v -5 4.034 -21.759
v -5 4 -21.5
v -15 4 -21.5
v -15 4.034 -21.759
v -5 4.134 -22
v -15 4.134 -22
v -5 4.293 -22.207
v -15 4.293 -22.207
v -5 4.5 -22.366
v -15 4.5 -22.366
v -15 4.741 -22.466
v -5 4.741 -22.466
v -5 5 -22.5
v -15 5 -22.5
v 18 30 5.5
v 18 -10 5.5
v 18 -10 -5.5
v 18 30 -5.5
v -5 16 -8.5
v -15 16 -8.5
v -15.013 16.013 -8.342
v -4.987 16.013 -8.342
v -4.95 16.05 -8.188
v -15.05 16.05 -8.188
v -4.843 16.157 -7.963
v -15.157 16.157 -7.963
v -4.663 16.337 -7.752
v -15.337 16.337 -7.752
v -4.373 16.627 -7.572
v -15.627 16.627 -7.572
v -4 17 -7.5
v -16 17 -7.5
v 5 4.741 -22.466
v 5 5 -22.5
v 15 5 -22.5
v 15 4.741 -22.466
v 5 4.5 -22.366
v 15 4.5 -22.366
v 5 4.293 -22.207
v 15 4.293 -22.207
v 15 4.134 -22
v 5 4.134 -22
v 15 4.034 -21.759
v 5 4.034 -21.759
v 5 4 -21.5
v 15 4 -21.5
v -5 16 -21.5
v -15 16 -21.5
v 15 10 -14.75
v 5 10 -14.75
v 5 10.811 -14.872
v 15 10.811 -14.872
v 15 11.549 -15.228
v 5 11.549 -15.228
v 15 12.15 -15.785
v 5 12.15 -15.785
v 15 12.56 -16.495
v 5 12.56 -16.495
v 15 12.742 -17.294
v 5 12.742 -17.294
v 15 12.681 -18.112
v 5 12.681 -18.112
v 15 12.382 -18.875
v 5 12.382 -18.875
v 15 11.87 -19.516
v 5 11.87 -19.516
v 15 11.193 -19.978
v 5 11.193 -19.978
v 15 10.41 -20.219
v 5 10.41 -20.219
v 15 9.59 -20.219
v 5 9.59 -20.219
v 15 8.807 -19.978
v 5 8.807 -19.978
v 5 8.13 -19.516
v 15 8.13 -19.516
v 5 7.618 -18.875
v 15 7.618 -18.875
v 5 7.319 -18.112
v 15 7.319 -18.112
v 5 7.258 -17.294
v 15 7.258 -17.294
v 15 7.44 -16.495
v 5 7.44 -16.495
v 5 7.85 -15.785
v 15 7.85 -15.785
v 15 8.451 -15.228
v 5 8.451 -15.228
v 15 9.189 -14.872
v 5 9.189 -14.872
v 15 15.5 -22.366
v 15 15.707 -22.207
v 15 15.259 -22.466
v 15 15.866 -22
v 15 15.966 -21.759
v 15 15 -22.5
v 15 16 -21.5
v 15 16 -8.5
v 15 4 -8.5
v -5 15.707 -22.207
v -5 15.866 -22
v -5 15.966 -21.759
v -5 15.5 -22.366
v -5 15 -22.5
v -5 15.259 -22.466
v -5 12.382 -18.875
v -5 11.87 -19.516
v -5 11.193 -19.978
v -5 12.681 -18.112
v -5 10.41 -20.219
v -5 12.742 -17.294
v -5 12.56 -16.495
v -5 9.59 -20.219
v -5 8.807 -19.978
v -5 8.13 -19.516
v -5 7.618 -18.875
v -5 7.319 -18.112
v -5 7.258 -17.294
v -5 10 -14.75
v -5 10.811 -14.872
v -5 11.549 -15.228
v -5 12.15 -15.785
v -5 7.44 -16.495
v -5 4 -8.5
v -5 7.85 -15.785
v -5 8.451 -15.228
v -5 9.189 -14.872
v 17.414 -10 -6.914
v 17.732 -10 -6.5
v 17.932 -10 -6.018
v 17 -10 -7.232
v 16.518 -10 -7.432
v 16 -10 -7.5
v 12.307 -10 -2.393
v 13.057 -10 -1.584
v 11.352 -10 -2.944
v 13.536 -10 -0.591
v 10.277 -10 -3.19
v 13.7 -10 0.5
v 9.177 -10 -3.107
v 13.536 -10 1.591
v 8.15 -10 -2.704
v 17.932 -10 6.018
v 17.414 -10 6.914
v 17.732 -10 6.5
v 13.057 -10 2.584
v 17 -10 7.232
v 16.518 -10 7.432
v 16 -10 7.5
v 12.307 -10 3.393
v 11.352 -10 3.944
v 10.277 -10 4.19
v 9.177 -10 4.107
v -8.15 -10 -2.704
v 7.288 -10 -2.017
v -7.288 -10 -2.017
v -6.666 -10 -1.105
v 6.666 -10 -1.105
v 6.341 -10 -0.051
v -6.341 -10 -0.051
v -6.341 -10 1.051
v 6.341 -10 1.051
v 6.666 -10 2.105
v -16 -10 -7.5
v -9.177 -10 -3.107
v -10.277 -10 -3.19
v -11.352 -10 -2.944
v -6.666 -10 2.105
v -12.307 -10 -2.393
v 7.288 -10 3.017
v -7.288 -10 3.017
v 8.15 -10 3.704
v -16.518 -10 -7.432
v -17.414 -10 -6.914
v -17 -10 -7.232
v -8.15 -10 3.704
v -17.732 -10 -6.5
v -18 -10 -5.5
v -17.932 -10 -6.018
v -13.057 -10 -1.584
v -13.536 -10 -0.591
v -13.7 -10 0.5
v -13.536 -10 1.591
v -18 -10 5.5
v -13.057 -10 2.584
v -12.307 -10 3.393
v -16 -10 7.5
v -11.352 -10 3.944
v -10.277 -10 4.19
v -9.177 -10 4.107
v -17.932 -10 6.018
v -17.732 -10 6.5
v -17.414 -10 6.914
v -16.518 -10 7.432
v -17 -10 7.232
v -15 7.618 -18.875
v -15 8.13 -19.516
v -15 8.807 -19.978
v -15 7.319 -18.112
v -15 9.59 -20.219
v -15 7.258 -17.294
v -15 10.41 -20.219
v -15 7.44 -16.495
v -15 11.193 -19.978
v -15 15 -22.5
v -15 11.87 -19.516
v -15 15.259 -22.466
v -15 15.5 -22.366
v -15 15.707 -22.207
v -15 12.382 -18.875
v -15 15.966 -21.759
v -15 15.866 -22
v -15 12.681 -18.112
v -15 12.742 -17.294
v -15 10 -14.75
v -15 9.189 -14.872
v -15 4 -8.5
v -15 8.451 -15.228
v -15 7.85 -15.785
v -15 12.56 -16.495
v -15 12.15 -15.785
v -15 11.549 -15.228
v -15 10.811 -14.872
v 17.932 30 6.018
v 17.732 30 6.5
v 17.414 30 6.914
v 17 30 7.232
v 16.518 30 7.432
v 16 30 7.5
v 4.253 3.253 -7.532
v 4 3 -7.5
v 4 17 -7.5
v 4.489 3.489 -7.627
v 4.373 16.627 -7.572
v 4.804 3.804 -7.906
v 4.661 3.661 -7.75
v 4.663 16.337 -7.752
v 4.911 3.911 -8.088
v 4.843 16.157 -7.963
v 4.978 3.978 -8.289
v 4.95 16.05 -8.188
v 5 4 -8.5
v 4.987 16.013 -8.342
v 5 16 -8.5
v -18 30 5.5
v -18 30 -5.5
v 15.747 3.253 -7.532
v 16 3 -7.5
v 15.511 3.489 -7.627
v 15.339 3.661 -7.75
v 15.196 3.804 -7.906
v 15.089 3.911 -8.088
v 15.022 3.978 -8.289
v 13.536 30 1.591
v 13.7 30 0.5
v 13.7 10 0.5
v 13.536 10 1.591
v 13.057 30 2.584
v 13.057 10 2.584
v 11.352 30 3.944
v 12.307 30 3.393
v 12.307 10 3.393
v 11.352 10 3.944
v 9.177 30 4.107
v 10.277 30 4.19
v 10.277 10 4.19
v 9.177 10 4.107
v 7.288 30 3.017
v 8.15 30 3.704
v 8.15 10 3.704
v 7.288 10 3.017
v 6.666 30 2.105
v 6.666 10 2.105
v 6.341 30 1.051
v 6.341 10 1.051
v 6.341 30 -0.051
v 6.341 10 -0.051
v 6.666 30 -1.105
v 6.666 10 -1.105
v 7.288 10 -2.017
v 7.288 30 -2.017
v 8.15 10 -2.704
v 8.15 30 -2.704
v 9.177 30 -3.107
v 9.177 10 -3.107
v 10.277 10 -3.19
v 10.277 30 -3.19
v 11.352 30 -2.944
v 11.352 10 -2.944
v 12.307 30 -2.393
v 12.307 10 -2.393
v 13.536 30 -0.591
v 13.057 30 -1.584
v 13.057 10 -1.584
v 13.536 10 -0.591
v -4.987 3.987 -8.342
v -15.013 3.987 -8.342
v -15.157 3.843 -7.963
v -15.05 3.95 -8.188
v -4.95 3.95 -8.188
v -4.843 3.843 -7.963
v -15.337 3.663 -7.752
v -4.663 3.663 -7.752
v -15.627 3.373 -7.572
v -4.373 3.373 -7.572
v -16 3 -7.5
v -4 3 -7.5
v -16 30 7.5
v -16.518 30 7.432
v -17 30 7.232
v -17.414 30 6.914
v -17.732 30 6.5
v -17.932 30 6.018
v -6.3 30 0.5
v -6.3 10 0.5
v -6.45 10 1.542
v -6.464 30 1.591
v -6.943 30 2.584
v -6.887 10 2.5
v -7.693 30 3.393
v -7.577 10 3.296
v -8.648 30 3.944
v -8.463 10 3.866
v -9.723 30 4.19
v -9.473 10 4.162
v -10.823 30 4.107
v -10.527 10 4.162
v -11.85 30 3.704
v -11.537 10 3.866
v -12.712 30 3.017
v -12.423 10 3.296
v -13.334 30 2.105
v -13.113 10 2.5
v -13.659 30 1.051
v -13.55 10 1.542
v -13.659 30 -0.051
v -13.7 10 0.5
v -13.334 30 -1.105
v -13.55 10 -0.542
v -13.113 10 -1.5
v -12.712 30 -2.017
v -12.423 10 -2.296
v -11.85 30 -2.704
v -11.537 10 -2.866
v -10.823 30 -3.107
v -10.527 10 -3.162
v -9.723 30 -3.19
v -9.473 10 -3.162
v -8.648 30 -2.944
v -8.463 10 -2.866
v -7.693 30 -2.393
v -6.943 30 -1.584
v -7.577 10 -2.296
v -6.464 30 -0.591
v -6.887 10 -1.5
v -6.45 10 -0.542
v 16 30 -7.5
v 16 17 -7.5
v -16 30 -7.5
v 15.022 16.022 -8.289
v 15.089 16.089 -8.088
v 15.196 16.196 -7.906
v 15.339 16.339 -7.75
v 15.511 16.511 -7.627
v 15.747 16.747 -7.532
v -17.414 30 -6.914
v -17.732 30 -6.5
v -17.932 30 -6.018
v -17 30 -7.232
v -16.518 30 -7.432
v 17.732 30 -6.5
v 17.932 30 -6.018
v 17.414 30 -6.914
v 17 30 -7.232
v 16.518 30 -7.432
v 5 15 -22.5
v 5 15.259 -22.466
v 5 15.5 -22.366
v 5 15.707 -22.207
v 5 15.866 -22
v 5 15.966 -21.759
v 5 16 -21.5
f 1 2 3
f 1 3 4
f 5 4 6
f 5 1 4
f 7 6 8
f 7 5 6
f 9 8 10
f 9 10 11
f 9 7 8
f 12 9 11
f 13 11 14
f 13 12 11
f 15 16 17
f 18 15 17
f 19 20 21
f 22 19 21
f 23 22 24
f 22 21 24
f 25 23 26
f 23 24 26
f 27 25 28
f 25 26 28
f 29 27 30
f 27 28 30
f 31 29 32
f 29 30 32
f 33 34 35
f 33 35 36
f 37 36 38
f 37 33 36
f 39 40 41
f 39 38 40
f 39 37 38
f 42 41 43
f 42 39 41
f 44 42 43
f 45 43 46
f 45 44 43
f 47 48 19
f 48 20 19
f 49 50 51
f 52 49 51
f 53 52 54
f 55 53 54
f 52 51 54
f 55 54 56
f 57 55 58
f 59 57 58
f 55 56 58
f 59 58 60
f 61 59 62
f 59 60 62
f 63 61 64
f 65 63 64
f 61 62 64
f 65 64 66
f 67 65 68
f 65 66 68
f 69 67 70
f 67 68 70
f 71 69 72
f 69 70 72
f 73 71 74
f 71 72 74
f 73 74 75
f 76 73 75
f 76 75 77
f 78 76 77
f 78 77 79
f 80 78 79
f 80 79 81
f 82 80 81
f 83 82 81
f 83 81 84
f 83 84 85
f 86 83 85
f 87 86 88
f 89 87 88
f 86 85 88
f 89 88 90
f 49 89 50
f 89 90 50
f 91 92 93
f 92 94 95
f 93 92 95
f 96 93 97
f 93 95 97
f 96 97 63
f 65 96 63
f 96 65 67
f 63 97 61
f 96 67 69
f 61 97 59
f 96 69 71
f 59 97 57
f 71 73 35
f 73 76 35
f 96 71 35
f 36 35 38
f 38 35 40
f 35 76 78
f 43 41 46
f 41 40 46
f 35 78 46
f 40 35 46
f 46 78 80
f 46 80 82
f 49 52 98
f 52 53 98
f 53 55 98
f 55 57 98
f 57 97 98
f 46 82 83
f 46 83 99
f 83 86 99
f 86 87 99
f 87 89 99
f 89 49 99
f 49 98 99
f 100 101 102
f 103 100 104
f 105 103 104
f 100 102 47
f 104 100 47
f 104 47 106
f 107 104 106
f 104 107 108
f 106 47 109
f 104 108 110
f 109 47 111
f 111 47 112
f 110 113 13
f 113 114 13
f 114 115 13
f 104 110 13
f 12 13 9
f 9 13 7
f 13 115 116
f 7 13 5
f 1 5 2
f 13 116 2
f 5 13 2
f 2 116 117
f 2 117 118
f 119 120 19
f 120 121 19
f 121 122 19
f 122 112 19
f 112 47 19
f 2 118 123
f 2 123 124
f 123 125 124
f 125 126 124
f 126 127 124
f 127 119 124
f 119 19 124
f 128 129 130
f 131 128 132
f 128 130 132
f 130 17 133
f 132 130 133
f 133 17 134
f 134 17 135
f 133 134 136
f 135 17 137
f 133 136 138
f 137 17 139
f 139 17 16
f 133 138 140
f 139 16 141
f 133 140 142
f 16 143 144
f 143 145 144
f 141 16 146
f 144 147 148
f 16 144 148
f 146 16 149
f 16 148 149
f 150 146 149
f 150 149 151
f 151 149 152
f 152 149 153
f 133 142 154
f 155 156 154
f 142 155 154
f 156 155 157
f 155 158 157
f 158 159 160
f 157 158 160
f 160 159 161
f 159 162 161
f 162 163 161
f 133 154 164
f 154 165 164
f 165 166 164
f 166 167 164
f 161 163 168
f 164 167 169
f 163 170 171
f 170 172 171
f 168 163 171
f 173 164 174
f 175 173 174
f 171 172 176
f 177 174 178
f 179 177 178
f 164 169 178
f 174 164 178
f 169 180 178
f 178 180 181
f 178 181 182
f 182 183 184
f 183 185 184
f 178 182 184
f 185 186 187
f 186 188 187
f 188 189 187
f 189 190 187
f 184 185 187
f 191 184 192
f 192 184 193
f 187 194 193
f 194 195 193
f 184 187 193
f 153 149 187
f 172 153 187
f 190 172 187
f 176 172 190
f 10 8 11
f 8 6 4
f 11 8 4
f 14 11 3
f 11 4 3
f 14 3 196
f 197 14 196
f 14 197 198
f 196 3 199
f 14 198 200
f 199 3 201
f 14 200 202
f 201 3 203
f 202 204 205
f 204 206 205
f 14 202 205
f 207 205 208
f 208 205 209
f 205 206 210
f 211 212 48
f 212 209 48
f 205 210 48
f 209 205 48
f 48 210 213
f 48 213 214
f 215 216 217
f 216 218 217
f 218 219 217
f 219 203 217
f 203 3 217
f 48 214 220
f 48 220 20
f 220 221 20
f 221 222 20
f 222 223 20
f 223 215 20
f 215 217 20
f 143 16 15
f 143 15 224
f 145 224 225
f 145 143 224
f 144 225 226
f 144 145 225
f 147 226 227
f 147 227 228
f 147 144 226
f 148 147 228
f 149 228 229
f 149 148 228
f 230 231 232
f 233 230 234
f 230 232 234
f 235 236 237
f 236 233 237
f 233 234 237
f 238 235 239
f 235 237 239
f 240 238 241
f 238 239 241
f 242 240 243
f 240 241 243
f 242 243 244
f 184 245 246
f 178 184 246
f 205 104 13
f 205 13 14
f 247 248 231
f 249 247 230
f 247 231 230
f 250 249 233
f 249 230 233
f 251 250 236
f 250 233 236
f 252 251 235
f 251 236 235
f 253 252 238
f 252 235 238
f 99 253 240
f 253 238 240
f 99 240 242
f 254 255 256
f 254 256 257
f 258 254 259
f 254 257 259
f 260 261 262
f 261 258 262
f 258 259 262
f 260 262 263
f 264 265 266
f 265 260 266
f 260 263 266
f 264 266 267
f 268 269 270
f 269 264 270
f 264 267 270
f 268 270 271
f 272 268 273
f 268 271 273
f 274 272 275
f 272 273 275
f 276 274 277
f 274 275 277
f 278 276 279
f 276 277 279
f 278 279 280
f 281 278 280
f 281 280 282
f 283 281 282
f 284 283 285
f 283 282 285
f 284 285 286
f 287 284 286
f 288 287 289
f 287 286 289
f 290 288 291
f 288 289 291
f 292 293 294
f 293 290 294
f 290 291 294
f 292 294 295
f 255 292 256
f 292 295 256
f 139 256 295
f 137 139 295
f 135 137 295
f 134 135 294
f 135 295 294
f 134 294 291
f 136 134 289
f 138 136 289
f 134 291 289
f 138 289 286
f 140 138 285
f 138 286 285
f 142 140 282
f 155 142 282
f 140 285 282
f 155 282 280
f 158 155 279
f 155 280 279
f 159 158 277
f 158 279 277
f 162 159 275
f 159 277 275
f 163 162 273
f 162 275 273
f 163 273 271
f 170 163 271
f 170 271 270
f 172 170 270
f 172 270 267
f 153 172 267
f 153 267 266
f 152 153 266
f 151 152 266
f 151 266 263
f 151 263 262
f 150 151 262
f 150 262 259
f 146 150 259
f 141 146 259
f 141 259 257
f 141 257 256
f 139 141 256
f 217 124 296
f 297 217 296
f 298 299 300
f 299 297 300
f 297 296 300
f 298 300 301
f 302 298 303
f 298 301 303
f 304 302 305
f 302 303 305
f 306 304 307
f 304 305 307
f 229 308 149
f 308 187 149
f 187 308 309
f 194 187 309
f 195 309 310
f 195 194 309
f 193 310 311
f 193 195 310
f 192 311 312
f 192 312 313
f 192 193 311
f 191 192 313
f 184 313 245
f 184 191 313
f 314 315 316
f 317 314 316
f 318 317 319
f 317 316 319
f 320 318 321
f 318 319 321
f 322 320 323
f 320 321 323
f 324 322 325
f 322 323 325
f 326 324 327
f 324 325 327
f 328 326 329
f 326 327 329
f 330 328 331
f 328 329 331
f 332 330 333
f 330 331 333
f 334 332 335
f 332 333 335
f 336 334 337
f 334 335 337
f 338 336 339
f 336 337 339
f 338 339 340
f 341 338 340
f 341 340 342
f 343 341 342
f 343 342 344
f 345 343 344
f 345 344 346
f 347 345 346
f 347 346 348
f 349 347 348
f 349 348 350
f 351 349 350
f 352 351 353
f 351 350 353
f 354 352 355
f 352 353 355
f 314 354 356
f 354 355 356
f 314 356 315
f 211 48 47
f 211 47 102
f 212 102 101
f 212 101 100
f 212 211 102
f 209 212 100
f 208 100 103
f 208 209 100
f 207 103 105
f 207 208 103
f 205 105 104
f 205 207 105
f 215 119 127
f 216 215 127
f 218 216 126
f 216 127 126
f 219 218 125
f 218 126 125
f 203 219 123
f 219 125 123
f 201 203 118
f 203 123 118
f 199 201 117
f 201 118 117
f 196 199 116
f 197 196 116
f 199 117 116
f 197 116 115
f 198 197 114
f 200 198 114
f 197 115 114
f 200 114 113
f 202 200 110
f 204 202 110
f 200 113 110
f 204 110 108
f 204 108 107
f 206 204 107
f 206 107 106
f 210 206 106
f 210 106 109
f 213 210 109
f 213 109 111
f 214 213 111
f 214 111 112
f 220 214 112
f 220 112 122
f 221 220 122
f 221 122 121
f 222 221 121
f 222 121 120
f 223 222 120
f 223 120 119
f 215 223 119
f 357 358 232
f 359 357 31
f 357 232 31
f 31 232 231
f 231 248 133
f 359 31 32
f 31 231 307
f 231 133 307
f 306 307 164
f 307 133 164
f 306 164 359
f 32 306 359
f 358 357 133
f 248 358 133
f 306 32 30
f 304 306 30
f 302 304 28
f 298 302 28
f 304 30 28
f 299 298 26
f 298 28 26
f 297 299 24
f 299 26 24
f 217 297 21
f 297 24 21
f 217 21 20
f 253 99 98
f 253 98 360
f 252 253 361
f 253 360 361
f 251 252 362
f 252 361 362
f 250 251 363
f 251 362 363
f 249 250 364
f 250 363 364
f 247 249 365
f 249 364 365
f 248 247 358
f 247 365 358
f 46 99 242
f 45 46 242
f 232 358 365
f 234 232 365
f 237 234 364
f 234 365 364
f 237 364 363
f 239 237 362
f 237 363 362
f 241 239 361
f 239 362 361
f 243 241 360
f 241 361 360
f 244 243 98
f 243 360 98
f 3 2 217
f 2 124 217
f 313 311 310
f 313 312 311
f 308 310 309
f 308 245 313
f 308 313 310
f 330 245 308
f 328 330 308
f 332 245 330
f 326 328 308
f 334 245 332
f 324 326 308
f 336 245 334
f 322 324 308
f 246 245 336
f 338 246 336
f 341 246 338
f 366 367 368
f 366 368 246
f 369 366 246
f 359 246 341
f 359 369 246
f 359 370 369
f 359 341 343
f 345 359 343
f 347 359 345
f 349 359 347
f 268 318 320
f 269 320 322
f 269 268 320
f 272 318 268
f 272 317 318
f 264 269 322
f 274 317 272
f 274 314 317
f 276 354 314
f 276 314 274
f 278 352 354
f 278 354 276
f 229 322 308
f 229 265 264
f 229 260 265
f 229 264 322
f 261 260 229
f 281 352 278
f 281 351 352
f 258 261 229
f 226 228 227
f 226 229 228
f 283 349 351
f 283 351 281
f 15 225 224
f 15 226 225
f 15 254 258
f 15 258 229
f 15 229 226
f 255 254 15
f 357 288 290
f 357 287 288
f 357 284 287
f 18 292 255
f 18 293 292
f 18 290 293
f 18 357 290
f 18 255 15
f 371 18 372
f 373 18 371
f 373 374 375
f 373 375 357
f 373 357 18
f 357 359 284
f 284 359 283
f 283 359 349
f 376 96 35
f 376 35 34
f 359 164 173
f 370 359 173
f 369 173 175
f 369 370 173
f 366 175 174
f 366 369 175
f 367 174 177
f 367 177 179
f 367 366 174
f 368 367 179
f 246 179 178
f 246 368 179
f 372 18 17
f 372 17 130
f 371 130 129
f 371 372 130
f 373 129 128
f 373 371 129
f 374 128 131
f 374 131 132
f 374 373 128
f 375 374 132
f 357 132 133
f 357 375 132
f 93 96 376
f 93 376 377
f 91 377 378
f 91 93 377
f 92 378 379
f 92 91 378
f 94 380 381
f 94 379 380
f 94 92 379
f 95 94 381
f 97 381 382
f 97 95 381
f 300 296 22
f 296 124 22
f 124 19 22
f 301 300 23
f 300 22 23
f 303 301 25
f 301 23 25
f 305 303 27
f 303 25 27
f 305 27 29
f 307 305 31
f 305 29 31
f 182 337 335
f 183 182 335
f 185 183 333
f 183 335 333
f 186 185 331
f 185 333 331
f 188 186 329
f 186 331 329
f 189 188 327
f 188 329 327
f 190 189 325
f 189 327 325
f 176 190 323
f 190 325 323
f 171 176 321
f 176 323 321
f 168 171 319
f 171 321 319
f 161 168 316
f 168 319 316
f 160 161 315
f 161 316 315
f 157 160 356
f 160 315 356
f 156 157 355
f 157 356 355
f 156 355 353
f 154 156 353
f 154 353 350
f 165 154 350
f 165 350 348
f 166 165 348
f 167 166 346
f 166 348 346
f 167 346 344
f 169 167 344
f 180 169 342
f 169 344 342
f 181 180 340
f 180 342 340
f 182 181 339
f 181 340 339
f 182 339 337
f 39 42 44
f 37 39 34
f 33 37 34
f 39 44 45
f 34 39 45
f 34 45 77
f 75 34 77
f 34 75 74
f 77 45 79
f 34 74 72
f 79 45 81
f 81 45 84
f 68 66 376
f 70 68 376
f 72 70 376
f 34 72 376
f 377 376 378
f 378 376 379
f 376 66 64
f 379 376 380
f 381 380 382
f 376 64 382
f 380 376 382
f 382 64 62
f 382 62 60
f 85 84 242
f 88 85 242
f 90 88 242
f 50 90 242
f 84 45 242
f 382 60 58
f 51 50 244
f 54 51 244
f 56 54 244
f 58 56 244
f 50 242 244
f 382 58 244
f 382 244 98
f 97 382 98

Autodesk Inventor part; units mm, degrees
ref_plane "YZ Plane" through (0, 0, 0) normal (1, 0, 0) x (0, 1, 0)
ref_plane "XZ Plane" through (0, 0, 0) normal (0, 1, 0) x (-1, 0, 0)
ref_plane "XY Plane" through (0, 0, 0) normal (0, 0, 1) x (1, 0, 0)
sketch "Szkic2" plane through (0, 0, 0) normal (0, 1, 0) x (-1, 0, 0)
  line L0 (-20, -7.5) -> (20, -7.5)
  line L1 (20, -7.5) -> (20, 7.5)
  line L2 (20, 7.5) -> (-20, 7.5)
  line L3 (-20, 7.5) -> (-20, -7.5)
  line L4 (-20, -7.5) -> (20, 7.5) construction
  line L5 (20, -7.5) -> (-20, 7.5) construction
  point P0 (0, 0)
  dimension "d12" = 40
  dimension "d13" = 15
extrude "Wyciągnięcie proste1" add sketch "Szkic2" along normal mid plane 20
sketch "Szkic3" plane through (0, 10, 0) normal (0, 1, 0) x (1, 0, 0)
  line L0 (18, 7.5) -> (-18, 7.5)
  line L1 (-18, 7.5) -> (-18, -7.5)
  line L2 (-18, -7.5) -> (18, -7.5)
  line L3 (18, -7.5) -> (18, 7.5)
  line L4 (18, 7.5) -> (-18, -7.5) construction
  line L5 (-18, 7.5) -> (18, -7.5) construction
  circle A0 centre (10, -0.5) radius 6
  circle A1 centre (-10, -0.5) radius 6
  circle A2 centre (10, -0.5) radius 3.7
  circle A3 centre (-10, -0.5) radius 3.7
  line L6 (-20, -7.5) -> (20, -7.5) projected
  point P0 (0, 0)
  point P1 (10, -7)
  point P2 (10, 8)
  point P3 (-13.3166, 8)
  point P4 (-10, -7)
  point P5 (15.1962, -4)
  point P6 (-15.1962, -4)
  dimension "d16" = 36
  dimension "d17" = 15
  dimension "d18" = 12
  dimension "d19" = 8
  dimension "d20" = 8
  dimension "d21" = 12
  dimension "d22" = 8
  dimension "d23" = 8
  dimension "d24" = 7.4
  dimension "d25" = 7.4
fillet "Zaokrąglenie1" radius 2 4 edges at (20, 0, 7.5) (-20, 0, 7.5) (20, 0, -7.5) (-20, 0, -7.5)
extrude "Wyciągnięcie proste3" add sketch "Szkic3" along normal blind 20 contours L3 L2 L1 L0 | A0 | A1
sketch "Szkic4" plane through (18, 10, -7.5) normal (0, 0, -1) x (-1, 0, 0)
  line L0 (33, 0) -> (23, -20) construction
  line L1 (23, 0) -> (33, -20) construction
  line L2 (13, 6) -> (3, 6)
  line L3 (3, 6) -> (3, -6)
  line L4 (3, -6) -> (13, -6)
  line L5 (13, -6) -> (13, 6)
  line L6 (13, 6) -> (3, -6) construction
  line L7 (3, 6) -> (13, -6) construction
  line L8 (36, -20) -> (0, -20) projected
  line L9 (0, 0) -> (36, 0) projected
  line L10 (-2, 0) -> (-2, -20) projected
  line L11 (0, 20) -> (36, 20) projected
  point P0 (18, -10)
  point P1 (28, -10)
  point P2 (8, 0)
  dimension "d32" = 14
  dimension "d38" = 10
  dimension "d39" = 5
  dimension "d68" = 14
extrude "Wyciągnięcie proste4" add sketch "Szkic4" along normal blind 15
sketch "Szkic7" plane through (5, 4, -7.5) normal (-1, 0, 0) x (0, 0, 1)
  line L0 (-15, 12) -> (-15, 0) projected
  line L1 (-15, 0) -> (-15, 3)
  line L2 (0, -14) -> (0, 6) projected
  line L3 (0, 0) -> (-15, 0) projected
  line L4 (0, 0) -> (-15, 0)
  line L5 (-15, 12) -> (-15, 9)
  line L6 (0, 12) -> (-15, 12) projected
  line L7 (0, 12) -> (-15, 12)
  circle A0 centre (-10, 6) radius 2.75
  point P0 (7.5, -4)
  dimension "d48" = 5.5
  dimension "d49" = 6
  dimension "d69" = 5
extrude "Wyciągnięcie proste6" cut sketch "Szkic7" against normal blind 15
mirror "Odbij1" about plane through (0, 0, 0) normal (1, 0, 0) of "Wyciągnięcie proste6", "Wyciągnięcie proste4"
sketch "Szkic11" plane through (0, 10, 0) normal (0, 1, 0) x (1, 0, 0)
  line L0 (18, -7.5) -> (-18, -7.5) projected
  line L1 (18, -7.5) -> (20, -7.5)
  line L2 (20, -7.5) -> (20, 7.5)
  line L3 (20, 7.5) -> (18, 7.5)
  line L4 (18, 7.5) -> (18, -7.5)
  point P0 (0, 0)
  dimension "d63" = 2
  dimension "d64" = 15
extrude "Wyciągnięcie proste7" cut sketch "Szkic11" against normal blind 20
mirror "Odbij3" about plane through (0, 0, 0) normal (1, 0, 0) of "Wyciągnięcie proste7"
fillet "Zaokrąglenie4" radius 2 4 edges at (-18, 10, 7.5) (-18, 10, -7.5) (18, 10, -7.5) (18, 10, 7.5)
fillet "Zaokrąglenie5" radius 1 4 edges at (-10, 16, -22.5) (-10, 4, -22.5) (10, 4, -22.5) (10, 16, -22.5)
fillet "Zaokrąglenie6" radius 1 8 edges at (-15, 10, -7.5) (-10, 16, -7.5) (-10, 4, -7.5) (-5, 10, -7.5) (10, 4, -7.5) (5, 10, -7.5) (15, 10, -7.5) (10, 16, -7.5)
sketch "Szkic12" plane through (10, 10, 0.5) normal (0, 1, 0) x (1, 0, 0)
  circle A0 centre (0, 0) radius 3.7
  point P0 (-10, 0.5)
extrude "Wyciągnięcie proste8" cut sketch "Szkic12" against normal blind 44
mirror "Odbij4" about plane through (0, 0, 0) normal (1, 0, 0) of "Wyciągnięcie proste8"
properties part number "zaslepka"
